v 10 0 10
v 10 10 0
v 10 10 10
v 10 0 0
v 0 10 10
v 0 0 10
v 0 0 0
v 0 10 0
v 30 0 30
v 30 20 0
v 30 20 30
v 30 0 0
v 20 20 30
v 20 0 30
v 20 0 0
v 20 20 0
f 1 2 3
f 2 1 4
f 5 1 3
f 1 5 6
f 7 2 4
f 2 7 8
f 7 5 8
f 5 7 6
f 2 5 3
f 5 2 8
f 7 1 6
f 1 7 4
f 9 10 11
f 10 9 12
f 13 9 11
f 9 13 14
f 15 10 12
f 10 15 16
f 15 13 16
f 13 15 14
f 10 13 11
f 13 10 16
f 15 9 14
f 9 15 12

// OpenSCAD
cube(10);
translate([20,0,0]);
cube(10);
translate([20,0,0]) cube([10,20,30]);
